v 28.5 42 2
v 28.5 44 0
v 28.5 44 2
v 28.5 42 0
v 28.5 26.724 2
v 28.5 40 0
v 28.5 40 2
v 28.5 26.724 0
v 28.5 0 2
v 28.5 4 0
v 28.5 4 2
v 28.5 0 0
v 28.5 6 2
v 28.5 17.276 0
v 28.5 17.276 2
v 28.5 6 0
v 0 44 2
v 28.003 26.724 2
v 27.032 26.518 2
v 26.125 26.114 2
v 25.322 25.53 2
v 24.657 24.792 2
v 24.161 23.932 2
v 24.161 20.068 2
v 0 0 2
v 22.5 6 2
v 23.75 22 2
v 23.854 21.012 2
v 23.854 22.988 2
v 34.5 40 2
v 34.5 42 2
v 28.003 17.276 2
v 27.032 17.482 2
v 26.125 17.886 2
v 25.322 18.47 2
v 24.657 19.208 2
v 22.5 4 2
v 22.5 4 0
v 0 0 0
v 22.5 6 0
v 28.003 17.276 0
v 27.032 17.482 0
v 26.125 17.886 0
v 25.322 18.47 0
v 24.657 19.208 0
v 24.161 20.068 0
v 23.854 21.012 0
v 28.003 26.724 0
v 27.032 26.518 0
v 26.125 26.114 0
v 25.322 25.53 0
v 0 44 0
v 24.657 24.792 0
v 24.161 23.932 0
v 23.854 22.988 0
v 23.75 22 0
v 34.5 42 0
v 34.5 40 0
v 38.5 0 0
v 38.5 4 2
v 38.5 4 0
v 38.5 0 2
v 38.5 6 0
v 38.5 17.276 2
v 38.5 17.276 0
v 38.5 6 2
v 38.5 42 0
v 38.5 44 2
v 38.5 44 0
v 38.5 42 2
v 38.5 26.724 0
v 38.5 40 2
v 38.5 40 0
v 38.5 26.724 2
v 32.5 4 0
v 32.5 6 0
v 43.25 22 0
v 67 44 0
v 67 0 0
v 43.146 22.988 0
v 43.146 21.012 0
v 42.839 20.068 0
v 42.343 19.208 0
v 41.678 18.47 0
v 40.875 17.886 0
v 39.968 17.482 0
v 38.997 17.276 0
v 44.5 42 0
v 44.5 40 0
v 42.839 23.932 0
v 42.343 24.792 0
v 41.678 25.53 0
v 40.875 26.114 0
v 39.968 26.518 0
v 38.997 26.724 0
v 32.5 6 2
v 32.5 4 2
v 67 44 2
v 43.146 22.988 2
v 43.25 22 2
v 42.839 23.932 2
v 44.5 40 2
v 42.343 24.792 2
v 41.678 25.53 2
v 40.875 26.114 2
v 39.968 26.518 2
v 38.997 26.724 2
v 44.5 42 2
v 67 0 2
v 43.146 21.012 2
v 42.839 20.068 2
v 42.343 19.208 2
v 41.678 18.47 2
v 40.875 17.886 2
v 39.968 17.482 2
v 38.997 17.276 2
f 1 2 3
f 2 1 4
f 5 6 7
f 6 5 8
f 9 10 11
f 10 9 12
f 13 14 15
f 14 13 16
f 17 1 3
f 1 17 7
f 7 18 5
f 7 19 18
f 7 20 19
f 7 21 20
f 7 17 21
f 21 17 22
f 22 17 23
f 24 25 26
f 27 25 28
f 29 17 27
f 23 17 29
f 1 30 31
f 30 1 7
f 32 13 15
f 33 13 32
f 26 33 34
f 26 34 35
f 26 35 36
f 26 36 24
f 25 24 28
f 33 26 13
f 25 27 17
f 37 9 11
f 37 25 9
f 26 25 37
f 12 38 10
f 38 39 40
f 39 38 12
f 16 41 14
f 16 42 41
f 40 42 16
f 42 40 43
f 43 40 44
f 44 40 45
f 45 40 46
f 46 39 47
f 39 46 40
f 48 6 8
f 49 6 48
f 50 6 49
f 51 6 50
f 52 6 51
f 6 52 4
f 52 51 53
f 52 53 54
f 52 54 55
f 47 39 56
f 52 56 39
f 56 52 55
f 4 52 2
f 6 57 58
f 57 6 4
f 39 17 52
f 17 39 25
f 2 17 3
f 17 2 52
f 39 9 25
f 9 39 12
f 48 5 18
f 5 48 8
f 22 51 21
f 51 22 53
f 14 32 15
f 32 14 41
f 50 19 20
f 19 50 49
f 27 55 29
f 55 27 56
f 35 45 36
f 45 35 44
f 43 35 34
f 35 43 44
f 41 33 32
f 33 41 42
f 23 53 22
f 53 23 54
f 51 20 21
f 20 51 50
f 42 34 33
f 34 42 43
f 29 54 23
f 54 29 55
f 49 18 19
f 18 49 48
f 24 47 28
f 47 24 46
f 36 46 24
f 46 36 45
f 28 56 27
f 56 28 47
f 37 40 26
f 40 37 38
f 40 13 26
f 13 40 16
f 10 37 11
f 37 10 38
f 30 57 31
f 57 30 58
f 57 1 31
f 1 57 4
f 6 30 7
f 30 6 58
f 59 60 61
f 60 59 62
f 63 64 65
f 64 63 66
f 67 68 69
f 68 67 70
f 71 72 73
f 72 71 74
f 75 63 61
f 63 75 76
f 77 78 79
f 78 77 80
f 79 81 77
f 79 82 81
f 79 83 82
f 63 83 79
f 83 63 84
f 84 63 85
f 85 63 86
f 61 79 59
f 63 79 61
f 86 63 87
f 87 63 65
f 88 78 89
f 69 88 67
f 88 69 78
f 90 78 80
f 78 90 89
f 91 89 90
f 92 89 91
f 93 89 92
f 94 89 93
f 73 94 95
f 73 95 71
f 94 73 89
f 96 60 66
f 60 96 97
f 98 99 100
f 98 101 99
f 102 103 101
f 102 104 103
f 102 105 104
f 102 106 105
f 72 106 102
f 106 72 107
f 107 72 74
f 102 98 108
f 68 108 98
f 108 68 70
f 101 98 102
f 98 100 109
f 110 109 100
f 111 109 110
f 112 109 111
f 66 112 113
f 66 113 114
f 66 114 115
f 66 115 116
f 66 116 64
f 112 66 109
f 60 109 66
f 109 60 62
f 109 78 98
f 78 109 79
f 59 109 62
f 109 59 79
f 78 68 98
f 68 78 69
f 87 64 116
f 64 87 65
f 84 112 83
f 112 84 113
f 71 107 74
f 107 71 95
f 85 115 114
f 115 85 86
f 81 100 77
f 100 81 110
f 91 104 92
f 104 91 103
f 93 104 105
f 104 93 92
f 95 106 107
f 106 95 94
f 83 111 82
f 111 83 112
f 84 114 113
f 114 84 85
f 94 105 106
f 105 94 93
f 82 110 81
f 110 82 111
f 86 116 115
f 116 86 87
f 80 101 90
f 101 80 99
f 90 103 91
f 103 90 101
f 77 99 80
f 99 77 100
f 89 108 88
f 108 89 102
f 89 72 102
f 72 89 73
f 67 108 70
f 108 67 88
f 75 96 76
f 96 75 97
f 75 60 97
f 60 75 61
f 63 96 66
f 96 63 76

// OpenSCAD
$fn=30;
module lensholder1(){
difference(){
difference(){
cube([57/2,44,2]);
translate([57/2,44/2,0])cylinder(r=9.5/2,h=2);
}

translate([57/2-6,4,0])cube([6,2,2]);
}
translate([57/2,44-4,0])cube([6,2,2]);
}
module lensholder2(){
difference(){
difference(){
cube([57/2,44,2]);
translate([57/2,44/2,0])cylinder(r=9.5/2,h=2);
}

translate([57/2-6,2,0])cube([6,2,2]);
}
translate([57/2,44-6,0])cube([6,2,2]);
}
lensholder1();
translate([57+10,44,2])rotate(a=180,v=[1,0,0])mirror([1,0,0])lensholder2();
